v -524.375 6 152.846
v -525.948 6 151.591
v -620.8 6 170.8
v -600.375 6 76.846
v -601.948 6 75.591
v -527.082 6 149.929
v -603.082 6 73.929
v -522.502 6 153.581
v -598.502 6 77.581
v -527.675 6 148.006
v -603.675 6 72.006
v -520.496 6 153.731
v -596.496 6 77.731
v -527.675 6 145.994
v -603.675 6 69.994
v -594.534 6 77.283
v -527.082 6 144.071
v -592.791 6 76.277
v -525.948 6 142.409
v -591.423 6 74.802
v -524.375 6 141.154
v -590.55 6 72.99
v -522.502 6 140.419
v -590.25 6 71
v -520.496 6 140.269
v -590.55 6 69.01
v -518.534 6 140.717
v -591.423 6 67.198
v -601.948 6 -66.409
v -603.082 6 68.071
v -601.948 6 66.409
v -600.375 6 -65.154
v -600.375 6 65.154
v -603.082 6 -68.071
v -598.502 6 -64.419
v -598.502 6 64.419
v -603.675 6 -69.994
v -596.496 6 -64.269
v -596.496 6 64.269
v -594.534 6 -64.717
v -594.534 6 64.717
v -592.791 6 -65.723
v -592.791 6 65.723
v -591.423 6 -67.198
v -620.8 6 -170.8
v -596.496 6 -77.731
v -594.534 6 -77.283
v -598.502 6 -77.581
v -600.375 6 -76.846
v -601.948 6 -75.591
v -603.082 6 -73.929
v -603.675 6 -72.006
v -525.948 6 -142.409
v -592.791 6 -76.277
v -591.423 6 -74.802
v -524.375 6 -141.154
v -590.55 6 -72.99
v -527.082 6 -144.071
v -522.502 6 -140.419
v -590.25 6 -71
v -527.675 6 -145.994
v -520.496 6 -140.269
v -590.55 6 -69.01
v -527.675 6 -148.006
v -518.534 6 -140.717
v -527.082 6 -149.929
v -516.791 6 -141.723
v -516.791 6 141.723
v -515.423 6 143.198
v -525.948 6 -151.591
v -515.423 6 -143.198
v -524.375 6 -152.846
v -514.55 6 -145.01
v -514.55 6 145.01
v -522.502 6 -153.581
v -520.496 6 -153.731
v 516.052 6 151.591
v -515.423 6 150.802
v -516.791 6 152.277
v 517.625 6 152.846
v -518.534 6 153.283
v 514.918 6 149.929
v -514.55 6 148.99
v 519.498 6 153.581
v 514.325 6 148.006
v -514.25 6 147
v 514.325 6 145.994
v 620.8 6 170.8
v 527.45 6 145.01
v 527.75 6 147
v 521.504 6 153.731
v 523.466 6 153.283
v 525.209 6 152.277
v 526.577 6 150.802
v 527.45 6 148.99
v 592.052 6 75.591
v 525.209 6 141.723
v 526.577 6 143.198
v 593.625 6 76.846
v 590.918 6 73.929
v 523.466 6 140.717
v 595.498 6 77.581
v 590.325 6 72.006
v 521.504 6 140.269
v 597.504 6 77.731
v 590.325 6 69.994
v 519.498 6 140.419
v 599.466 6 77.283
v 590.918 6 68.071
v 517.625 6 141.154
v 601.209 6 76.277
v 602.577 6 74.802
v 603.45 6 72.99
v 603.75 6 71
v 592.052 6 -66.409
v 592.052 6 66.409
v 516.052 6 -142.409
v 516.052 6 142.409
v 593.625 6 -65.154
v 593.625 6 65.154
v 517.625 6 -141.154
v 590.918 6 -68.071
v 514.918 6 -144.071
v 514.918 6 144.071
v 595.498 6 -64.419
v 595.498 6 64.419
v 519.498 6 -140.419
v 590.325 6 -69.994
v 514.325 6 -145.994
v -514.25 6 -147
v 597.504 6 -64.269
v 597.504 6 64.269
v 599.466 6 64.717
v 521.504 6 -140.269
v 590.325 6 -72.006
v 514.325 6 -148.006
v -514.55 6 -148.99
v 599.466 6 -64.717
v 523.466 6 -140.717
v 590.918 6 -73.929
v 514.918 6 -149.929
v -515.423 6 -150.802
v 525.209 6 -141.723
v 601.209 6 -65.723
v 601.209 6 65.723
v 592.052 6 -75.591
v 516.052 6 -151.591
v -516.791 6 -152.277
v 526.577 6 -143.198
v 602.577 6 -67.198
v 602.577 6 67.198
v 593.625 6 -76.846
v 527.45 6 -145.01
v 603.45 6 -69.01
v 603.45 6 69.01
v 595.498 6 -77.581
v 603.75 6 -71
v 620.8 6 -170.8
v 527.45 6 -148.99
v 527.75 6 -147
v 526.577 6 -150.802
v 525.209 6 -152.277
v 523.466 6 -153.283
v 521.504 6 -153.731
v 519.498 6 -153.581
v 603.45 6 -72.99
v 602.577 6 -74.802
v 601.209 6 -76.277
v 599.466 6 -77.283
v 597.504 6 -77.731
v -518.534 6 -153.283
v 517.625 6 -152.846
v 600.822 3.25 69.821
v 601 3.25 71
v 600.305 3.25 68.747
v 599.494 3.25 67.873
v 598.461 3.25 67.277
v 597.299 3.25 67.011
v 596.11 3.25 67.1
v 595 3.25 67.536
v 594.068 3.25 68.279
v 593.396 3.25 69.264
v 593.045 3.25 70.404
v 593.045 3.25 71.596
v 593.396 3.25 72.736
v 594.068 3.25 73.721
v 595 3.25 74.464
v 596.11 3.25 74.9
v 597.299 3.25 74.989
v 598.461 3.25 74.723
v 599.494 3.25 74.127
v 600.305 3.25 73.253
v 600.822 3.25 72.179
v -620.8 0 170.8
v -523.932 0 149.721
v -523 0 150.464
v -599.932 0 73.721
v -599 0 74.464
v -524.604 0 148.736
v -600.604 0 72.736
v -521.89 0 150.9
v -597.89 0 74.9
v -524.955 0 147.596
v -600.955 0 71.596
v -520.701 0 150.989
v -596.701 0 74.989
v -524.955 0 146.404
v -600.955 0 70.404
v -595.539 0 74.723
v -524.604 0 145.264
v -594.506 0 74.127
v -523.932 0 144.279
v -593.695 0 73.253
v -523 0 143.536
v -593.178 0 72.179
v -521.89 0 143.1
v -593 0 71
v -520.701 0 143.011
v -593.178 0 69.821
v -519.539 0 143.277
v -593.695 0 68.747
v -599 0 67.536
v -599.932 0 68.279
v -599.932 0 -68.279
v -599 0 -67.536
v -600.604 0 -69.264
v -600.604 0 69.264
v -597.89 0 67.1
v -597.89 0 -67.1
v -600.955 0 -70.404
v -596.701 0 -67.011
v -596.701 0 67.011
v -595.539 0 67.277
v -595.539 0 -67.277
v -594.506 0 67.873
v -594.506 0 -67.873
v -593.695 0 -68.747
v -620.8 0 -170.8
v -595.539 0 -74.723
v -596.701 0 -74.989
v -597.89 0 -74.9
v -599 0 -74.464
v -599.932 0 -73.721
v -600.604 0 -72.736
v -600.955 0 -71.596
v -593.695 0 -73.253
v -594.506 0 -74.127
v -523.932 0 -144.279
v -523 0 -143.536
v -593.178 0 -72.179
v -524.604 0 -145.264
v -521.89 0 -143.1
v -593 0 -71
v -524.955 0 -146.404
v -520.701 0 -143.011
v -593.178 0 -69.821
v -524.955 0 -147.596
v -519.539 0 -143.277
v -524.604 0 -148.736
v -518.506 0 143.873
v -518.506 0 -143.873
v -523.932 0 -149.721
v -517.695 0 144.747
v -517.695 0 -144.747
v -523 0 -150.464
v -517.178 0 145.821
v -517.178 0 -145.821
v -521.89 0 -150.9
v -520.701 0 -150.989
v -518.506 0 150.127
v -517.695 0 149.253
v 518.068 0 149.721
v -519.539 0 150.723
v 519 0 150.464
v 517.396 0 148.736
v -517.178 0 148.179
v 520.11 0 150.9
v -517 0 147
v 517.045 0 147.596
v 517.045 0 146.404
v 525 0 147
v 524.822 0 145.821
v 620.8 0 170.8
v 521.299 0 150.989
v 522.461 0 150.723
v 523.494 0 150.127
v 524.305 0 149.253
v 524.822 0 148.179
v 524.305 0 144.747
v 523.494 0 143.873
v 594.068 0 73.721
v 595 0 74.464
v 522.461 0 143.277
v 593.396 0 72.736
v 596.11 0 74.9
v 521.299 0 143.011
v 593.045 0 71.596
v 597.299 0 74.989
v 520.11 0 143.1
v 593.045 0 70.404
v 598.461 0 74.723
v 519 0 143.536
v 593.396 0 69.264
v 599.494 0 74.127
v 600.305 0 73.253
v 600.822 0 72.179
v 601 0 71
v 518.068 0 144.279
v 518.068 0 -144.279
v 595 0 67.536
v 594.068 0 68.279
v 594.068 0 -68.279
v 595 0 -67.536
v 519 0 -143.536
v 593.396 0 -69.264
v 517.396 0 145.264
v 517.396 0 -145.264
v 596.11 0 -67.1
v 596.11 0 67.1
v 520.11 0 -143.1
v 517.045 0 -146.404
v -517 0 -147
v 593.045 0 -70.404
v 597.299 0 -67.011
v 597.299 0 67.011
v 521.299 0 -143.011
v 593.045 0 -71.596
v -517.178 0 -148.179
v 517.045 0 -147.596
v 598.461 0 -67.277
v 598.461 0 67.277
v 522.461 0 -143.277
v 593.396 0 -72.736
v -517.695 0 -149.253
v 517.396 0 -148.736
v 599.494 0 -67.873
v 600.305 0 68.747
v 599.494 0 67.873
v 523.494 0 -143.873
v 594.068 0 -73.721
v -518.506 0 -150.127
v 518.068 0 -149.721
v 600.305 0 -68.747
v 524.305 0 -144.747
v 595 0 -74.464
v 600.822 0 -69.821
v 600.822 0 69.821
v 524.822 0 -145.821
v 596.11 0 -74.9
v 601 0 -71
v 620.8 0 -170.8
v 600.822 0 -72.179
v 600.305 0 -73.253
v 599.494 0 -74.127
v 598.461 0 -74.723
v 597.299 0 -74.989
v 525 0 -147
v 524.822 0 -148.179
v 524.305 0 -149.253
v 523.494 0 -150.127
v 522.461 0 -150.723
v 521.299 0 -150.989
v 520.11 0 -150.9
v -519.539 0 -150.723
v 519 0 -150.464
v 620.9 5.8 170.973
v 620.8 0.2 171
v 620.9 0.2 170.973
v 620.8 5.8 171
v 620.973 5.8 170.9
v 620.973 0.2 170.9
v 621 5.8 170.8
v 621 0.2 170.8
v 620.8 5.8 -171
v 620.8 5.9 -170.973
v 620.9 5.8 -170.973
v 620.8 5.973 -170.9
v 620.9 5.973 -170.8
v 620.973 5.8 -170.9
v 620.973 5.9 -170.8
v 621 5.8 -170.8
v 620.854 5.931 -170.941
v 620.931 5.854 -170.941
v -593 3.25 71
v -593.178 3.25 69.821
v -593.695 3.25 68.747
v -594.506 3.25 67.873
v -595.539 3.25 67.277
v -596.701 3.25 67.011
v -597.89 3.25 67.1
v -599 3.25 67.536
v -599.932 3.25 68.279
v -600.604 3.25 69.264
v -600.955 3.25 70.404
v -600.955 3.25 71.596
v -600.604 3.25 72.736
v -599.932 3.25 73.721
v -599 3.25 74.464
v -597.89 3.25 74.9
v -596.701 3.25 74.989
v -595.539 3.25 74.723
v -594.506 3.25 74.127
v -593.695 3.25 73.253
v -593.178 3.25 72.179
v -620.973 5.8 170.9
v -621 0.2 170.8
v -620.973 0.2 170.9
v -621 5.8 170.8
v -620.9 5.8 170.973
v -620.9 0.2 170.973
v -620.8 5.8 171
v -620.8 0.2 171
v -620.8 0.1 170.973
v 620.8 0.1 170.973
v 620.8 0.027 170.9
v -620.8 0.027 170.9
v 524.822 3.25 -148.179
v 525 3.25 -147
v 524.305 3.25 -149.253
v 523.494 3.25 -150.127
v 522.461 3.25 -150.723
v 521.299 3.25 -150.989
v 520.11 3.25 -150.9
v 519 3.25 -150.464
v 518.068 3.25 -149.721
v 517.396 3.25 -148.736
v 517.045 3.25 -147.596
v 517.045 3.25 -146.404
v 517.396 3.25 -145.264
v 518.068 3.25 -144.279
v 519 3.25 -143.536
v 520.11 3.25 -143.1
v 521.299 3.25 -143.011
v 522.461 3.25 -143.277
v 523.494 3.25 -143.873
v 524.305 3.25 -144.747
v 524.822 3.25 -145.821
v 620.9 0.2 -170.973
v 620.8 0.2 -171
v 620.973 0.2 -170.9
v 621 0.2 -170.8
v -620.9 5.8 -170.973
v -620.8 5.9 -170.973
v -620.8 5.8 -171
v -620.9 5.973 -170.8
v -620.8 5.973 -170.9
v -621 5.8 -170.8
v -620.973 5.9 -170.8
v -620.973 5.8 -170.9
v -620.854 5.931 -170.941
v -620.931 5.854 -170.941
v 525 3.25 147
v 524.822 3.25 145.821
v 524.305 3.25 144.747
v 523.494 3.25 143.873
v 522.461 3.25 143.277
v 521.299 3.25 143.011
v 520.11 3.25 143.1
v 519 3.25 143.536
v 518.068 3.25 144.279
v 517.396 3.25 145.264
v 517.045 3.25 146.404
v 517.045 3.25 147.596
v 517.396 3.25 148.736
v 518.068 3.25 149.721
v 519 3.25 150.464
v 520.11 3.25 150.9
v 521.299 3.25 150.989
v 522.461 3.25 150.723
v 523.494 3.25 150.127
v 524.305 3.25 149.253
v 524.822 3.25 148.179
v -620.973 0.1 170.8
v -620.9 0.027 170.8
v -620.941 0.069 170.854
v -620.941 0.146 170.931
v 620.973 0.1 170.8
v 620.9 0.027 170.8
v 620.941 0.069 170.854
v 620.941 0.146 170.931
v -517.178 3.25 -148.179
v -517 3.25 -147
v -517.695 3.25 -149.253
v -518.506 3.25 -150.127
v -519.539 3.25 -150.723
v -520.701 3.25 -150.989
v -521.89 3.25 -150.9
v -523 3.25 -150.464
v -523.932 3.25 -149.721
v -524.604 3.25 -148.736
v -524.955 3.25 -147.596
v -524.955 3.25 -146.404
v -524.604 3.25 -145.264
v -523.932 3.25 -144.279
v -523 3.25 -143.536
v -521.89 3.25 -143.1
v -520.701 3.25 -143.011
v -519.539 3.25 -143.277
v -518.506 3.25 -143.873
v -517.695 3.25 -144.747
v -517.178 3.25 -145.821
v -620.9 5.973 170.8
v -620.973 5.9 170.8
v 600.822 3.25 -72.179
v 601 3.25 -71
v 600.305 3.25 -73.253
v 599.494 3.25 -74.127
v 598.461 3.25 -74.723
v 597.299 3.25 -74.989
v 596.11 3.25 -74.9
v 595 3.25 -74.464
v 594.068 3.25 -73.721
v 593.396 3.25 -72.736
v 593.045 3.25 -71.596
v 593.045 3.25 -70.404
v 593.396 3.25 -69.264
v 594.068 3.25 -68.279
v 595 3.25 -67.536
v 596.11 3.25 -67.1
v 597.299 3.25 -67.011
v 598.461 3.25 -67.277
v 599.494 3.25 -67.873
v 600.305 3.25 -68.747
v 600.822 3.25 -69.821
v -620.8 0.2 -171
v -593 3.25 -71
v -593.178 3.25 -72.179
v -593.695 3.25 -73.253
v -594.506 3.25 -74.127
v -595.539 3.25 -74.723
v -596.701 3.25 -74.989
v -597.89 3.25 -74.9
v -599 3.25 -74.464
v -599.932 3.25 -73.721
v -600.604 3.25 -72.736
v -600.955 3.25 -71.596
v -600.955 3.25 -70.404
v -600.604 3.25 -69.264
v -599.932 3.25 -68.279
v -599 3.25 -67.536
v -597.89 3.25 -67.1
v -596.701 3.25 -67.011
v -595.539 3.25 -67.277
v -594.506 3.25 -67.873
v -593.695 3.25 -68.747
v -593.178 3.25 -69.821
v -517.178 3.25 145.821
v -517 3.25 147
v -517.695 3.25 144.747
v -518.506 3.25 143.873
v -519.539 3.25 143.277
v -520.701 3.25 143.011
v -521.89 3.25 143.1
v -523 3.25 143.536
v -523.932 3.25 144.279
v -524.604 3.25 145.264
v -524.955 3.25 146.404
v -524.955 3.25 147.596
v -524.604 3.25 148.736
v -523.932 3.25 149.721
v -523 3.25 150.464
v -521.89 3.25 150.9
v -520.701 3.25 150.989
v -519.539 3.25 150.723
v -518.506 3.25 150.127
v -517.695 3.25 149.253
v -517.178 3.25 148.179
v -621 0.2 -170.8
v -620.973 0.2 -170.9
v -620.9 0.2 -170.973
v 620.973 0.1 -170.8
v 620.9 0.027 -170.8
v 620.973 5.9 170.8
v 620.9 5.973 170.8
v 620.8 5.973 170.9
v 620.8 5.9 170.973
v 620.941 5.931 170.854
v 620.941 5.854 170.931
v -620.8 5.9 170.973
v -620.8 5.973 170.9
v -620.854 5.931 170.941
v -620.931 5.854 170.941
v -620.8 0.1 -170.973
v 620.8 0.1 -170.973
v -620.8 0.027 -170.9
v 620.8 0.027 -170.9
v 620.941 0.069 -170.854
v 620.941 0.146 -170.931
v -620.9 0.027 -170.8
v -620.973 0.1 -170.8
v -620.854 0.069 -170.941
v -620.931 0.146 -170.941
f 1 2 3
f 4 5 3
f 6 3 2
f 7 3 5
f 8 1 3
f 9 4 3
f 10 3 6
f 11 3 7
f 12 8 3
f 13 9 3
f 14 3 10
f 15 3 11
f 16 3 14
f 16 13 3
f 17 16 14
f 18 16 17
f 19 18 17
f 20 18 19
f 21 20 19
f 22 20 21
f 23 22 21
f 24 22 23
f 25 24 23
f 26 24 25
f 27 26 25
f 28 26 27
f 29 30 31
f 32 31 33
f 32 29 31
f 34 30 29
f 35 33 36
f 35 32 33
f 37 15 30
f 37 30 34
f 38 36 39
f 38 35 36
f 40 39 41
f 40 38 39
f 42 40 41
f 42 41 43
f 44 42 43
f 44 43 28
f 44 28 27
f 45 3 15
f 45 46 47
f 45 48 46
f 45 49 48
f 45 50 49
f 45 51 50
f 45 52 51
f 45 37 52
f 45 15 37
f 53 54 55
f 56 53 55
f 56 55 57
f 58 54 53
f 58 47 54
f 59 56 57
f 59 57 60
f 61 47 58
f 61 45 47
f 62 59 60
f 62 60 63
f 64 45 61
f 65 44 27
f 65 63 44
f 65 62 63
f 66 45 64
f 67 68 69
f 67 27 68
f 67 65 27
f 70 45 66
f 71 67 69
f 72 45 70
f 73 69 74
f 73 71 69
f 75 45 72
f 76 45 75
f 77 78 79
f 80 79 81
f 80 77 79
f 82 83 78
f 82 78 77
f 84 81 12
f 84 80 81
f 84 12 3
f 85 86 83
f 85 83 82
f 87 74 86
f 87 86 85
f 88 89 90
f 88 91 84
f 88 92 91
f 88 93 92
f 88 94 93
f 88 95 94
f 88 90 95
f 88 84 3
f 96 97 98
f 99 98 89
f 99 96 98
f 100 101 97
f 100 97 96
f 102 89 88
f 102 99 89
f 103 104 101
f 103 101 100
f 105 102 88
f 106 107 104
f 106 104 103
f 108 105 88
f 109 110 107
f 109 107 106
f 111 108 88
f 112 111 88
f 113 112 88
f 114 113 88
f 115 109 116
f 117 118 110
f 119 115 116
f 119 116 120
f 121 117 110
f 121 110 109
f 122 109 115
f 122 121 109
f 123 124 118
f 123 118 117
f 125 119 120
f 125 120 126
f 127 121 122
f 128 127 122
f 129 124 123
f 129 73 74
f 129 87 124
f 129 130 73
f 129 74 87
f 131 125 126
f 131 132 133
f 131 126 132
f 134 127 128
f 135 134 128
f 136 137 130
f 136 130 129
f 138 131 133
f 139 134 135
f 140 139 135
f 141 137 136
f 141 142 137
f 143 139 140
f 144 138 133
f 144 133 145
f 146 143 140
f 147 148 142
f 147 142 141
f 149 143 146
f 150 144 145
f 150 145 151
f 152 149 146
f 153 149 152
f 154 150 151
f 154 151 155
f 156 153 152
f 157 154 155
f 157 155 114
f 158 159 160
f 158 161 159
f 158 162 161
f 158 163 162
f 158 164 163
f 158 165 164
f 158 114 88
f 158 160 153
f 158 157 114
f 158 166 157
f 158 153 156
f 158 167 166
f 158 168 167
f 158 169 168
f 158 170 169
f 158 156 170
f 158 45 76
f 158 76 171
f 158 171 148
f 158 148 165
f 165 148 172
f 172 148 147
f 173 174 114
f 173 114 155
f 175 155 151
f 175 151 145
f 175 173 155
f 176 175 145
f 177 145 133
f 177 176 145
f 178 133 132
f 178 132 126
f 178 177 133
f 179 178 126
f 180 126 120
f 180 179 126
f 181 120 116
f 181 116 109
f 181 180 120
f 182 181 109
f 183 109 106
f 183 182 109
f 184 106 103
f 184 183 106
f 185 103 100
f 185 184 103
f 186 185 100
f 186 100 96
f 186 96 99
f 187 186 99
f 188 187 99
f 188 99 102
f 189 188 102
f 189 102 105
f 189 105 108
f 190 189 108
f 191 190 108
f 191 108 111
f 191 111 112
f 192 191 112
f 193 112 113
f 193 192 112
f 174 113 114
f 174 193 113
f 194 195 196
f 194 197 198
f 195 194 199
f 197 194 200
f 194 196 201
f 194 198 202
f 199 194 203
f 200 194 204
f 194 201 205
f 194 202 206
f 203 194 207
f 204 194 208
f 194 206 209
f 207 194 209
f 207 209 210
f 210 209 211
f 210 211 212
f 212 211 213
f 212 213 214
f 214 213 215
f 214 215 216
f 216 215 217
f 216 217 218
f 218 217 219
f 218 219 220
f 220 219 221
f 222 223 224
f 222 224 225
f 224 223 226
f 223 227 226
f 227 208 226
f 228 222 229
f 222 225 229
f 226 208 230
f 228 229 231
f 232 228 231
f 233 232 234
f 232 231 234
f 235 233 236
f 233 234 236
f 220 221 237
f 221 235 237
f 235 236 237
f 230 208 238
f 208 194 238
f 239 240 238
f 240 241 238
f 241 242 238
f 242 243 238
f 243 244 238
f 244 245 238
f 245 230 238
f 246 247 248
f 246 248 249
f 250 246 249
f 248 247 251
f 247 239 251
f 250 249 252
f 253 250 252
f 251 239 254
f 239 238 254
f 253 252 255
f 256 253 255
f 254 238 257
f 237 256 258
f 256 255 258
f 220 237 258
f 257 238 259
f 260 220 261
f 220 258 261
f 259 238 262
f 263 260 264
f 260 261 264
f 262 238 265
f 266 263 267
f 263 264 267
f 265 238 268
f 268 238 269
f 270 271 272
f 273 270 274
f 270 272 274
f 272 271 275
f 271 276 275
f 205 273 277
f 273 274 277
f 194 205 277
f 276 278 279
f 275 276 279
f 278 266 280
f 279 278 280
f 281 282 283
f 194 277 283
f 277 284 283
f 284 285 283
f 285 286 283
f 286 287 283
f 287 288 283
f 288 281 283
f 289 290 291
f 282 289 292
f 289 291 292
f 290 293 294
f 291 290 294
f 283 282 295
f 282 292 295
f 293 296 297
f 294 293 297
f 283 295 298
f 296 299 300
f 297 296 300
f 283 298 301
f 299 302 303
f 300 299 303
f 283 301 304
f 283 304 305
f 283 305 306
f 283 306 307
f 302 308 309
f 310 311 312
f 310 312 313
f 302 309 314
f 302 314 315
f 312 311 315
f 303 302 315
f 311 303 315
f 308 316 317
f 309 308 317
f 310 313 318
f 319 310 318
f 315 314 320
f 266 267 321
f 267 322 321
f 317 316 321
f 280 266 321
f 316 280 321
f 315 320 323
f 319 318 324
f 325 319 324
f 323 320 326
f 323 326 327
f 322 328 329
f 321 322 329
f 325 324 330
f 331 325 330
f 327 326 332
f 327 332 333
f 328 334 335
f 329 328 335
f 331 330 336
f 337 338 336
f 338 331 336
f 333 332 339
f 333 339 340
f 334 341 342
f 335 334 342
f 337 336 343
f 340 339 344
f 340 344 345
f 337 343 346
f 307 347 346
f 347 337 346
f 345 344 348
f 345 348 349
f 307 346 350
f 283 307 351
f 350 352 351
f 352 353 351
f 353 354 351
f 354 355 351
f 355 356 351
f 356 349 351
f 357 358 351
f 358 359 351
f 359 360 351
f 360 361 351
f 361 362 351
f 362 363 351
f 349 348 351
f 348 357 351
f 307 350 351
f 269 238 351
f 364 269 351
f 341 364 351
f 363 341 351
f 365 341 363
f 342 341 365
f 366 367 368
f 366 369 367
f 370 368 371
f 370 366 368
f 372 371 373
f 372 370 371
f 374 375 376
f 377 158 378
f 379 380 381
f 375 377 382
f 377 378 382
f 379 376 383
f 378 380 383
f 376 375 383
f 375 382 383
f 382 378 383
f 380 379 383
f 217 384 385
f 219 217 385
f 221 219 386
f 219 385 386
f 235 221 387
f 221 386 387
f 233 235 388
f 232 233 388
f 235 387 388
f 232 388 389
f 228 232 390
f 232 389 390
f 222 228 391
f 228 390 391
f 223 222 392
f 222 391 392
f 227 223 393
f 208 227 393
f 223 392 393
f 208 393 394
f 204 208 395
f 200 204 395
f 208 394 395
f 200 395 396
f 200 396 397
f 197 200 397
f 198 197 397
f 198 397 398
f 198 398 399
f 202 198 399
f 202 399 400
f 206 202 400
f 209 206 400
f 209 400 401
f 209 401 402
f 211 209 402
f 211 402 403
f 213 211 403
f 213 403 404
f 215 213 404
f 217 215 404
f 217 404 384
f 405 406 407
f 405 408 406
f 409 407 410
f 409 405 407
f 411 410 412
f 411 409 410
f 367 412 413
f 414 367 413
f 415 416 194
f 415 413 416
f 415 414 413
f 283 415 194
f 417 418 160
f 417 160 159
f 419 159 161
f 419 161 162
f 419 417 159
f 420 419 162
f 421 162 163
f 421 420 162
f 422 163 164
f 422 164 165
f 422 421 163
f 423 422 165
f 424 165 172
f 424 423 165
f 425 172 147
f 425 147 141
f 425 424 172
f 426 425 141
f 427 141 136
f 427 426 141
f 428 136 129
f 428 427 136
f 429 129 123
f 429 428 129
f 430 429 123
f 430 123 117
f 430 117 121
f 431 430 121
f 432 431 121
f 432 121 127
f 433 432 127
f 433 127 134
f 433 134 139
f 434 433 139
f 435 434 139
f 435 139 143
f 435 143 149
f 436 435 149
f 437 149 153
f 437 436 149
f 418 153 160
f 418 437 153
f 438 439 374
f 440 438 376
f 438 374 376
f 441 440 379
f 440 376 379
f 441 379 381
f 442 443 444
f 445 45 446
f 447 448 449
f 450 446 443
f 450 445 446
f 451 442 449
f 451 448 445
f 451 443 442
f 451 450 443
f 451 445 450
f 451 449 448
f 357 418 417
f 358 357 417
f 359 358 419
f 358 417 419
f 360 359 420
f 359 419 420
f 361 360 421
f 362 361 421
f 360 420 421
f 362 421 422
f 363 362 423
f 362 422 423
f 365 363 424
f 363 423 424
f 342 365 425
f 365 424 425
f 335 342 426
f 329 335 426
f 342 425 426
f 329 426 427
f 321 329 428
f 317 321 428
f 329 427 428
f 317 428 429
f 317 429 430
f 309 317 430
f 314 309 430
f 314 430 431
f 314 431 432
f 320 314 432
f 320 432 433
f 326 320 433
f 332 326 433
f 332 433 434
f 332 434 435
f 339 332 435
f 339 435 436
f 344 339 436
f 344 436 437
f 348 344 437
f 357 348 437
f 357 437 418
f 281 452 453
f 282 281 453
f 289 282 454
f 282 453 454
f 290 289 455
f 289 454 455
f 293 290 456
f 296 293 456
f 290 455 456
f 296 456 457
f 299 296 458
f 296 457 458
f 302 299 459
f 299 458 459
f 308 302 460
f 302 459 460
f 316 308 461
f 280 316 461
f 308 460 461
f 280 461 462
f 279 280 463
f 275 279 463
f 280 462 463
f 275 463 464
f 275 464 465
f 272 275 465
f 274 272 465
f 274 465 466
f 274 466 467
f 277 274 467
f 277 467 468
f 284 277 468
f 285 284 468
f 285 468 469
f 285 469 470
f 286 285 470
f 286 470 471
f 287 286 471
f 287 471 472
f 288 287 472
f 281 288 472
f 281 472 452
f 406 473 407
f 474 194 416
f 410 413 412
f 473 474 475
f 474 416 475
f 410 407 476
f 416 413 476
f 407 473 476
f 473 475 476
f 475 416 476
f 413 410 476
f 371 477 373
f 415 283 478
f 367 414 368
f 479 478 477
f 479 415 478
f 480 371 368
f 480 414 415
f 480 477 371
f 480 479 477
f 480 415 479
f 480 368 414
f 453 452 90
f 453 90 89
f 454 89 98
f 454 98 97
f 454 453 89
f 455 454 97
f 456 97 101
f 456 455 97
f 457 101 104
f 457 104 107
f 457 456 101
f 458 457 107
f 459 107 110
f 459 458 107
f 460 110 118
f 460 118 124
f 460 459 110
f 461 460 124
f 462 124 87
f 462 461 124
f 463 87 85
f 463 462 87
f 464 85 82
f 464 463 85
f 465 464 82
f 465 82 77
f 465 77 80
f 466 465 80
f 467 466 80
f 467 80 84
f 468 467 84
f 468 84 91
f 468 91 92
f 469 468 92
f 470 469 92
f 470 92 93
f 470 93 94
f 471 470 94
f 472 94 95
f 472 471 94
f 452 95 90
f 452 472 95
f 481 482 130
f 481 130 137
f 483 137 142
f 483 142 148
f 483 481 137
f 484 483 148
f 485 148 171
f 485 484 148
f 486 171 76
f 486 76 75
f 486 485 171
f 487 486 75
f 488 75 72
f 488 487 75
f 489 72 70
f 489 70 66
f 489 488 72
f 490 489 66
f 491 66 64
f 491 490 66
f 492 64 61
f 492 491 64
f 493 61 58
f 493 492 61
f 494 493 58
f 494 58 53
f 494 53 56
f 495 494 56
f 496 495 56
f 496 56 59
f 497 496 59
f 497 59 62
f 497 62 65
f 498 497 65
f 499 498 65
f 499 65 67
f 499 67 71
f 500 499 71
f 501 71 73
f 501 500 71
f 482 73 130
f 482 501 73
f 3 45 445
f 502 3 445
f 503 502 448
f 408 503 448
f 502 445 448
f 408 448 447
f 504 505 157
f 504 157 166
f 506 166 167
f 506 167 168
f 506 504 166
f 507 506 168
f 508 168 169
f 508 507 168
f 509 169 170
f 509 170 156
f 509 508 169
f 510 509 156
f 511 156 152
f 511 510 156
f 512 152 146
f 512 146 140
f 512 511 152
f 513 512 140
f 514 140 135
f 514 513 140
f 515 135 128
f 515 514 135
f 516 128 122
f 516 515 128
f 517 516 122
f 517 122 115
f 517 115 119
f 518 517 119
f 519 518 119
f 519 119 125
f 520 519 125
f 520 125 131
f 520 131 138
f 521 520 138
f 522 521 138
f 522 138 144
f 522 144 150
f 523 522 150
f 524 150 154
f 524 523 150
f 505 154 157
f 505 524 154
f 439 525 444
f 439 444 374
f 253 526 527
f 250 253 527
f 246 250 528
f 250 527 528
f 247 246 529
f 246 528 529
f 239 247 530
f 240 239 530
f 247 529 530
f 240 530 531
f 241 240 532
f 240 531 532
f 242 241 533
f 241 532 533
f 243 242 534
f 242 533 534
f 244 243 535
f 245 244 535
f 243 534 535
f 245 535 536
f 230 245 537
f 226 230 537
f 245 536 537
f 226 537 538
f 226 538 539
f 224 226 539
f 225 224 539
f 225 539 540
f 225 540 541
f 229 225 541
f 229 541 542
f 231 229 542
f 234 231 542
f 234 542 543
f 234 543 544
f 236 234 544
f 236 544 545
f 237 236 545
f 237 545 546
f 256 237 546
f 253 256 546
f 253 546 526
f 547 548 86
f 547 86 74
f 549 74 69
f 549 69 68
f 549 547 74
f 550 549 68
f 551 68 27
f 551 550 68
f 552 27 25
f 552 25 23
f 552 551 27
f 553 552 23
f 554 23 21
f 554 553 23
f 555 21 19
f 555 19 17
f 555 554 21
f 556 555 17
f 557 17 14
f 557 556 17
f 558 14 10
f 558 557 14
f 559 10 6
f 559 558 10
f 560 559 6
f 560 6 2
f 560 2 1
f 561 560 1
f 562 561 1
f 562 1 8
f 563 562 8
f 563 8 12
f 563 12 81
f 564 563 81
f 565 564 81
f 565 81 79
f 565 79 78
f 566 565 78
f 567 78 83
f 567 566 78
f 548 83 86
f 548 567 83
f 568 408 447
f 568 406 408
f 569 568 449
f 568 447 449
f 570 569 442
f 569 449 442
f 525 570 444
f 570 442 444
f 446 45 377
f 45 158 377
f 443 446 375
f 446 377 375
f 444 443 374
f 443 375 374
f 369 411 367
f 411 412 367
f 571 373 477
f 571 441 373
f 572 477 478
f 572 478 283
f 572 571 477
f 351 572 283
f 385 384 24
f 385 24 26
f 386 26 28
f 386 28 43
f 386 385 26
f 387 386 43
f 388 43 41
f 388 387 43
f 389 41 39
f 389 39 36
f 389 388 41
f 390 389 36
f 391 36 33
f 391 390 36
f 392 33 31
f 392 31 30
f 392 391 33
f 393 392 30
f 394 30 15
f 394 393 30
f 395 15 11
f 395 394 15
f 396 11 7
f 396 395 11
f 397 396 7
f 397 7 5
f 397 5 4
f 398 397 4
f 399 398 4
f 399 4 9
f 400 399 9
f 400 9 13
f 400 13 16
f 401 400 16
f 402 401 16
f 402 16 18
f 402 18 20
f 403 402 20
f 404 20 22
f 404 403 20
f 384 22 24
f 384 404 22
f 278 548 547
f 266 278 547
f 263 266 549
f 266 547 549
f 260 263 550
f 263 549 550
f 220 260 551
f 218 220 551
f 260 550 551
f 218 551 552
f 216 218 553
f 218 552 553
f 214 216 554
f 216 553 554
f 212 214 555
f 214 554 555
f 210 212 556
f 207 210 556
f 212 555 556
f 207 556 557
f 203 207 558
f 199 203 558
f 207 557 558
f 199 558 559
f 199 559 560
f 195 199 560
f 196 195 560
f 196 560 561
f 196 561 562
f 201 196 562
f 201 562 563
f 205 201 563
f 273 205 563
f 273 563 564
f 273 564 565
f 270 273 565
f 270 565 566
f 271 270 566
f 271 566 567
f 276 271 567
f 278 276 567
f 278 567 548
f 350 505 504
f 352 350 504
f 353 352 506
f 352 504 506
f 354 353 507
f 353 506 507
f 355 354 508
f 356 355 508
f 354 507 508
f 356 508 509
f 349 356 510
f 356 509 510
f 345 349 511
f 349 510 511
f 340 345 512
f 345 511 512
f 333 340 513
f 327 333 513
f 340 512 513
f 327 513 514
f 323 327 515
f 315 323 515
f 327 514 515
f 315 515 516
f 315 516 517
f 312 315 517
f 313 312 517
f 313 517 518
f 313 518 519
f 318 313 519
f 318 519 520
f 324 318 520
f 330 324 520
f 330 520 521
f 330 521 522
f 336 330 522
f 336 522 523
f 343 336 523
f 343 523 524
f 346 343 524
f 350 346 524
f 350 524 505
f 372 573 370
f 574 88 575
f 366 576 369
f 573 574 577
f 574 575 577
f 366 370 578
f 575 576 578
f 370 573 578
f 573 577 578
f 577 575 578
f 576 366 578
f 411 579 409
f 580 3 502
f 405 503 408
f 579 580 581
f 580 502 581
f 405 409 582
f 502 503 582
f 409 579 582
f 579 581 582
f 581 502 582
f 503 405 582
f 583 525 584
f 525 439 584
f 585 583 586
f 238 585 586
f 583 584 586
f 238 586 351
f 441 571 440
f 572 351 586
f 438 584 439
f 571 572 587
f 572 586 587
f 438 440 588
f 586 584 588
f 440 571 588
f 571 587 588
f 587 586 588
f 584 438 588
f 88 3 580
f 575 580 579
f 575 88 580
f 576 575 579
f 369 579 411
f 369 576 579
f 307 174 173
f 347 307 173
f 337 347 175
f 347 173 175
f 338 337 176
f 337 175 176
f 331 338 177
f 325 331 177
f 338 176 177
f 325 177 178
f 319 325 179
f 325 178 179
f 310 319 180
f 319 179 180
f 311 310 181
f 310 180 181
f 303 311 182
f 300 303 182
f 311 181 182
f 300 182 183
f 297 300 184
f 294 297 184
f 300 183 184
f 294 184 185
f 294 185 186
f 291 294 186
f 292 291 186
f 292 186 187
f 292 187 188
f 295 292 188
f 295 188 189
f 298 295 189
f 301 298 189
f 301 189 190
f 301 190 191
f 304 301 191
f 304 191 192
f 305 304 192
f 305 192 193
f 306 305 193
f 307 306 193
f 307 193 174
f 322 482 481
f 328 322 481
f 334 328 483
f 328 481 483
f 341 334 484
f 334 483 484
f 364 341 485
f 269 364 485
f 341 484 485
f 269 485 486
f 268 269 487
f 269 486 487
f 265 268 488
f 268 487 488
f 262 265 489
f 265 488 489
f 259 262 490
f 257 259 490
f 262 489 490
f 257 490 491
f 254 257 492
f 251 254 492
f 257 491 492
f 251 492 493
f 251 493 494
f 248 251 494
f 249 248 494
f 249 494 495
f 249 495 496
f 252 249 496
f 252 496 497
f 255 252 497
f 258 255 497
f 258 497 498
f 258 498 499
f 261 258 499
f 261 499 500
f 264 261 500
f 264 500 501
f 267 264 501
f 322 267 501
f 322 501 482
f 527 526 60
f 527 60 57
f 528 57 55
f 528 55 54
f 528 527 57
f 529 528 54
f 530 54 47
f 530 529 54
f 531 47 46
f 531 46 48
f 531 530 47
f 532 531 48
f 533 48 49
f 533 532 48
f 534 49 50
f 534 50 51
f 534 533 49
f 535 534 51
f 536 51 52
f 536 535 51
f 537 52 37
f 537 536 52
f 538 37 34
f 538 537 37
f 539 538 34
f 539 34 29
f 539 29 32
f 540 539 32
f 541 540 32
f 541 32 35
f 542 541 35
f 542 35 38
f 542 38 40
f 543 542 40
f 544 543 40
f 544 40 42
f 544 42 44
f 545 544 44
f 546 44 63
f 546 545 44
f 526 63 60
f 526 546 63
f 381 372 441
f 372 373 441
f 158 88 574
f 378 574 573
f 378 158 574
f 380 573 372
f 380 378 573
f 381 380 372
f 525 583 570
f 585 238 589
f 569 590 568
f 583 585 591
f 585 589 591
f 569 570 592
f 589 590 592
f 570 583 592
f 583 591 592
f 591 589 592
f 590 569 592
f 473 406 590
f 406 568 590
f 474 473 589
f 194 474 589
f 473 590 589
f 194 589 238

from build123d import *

# Parameters (mm, degrees)
SKETCH1_W           = 1242
SKETCH1_H           = 342
BOSS_EXTRUDE1_DEPTH = 6
SKETCH2_R           = 4
CUT_EXTRUDE1_DEPTH  = 7
CHAMFER1_SIZE       = 2.75
FILLET1_R           = 0.2


with BuildPart() as part:
    # Sketch1 → Boss-Extrude1 (new body)
    with BuildSketch(Plane(origin=(0, 0, 0), x_dir=(1, 0, 0), z_dir=(0, 1, 0))):
        Rectangle(SKETCH1_W, SKETCH1_H)
    extrude(amount=BOSS_EXTRUDE1_DEPTH)

    # Sketch2 → Cut-Extrude1 (cut, through all)
    with BuildSketch(Plane(origin=(0, 6, 0), x_dir=(1, 0, 0), z_dir=(0, 1, 0))):
        with Locations((-521, -147)):
            Circle(SKETCH2_R)
        with Locations((521, -147)):
            Circle(SKETCH2_R)
        with Locations((-597, -71)):
            Circle(SKETCH2_R)
        with Locations((597, -71)):
            Circle(SKETCH2_R)
        with Locations((597, 71)):
            Circle(SKETCH2_R)
        with Locations((521, 147)):
            Circle(SKETCH2_R)
        with Locations((-521, 147)):
            Circle(SKETCH2_R)
        with Locations((-597, 71)):
            Circle(SKETCH2_R)
    extrude(amount=-CUT_EXTRUDE1_DEPTH, mode=Mode.SUBTRACT)

    # Chamfer1
    chamfer1_edges = [part.edges().sort_by_distance(p)[0] for p in [
        (-525, 6, 147),
        (517, 6, 147),
        (-601, 6, 71),
        (593, 6, 71),
        (593, 6, -71),
        (517, 6, -147),
        (-525, 6, -147),
        (-601, 6, -71),
    ]]
    chamfer(chamfer1_edges, length=CHAMFER1_SIZE)

    # Fillet1
    fillet1_edges = [part.edges().sort_by_distance(p)[0] for p in [
        (-621, 6, 0),
        (0, 6, 171),
        (621, 6, 0),
        (0, 0, 171),
        (-621, 0, 0),
        (0, 0, -171),
        (621, 0, 0),
        (0, 6, -171),
        (621, 3, 171),
        (-621, 3, 171),
        (-621, 3, -171),
        (621, 3, -171),
    ]]
    fillet(fillet1_edges, radius=FILLET1_R)


solid = part.part
